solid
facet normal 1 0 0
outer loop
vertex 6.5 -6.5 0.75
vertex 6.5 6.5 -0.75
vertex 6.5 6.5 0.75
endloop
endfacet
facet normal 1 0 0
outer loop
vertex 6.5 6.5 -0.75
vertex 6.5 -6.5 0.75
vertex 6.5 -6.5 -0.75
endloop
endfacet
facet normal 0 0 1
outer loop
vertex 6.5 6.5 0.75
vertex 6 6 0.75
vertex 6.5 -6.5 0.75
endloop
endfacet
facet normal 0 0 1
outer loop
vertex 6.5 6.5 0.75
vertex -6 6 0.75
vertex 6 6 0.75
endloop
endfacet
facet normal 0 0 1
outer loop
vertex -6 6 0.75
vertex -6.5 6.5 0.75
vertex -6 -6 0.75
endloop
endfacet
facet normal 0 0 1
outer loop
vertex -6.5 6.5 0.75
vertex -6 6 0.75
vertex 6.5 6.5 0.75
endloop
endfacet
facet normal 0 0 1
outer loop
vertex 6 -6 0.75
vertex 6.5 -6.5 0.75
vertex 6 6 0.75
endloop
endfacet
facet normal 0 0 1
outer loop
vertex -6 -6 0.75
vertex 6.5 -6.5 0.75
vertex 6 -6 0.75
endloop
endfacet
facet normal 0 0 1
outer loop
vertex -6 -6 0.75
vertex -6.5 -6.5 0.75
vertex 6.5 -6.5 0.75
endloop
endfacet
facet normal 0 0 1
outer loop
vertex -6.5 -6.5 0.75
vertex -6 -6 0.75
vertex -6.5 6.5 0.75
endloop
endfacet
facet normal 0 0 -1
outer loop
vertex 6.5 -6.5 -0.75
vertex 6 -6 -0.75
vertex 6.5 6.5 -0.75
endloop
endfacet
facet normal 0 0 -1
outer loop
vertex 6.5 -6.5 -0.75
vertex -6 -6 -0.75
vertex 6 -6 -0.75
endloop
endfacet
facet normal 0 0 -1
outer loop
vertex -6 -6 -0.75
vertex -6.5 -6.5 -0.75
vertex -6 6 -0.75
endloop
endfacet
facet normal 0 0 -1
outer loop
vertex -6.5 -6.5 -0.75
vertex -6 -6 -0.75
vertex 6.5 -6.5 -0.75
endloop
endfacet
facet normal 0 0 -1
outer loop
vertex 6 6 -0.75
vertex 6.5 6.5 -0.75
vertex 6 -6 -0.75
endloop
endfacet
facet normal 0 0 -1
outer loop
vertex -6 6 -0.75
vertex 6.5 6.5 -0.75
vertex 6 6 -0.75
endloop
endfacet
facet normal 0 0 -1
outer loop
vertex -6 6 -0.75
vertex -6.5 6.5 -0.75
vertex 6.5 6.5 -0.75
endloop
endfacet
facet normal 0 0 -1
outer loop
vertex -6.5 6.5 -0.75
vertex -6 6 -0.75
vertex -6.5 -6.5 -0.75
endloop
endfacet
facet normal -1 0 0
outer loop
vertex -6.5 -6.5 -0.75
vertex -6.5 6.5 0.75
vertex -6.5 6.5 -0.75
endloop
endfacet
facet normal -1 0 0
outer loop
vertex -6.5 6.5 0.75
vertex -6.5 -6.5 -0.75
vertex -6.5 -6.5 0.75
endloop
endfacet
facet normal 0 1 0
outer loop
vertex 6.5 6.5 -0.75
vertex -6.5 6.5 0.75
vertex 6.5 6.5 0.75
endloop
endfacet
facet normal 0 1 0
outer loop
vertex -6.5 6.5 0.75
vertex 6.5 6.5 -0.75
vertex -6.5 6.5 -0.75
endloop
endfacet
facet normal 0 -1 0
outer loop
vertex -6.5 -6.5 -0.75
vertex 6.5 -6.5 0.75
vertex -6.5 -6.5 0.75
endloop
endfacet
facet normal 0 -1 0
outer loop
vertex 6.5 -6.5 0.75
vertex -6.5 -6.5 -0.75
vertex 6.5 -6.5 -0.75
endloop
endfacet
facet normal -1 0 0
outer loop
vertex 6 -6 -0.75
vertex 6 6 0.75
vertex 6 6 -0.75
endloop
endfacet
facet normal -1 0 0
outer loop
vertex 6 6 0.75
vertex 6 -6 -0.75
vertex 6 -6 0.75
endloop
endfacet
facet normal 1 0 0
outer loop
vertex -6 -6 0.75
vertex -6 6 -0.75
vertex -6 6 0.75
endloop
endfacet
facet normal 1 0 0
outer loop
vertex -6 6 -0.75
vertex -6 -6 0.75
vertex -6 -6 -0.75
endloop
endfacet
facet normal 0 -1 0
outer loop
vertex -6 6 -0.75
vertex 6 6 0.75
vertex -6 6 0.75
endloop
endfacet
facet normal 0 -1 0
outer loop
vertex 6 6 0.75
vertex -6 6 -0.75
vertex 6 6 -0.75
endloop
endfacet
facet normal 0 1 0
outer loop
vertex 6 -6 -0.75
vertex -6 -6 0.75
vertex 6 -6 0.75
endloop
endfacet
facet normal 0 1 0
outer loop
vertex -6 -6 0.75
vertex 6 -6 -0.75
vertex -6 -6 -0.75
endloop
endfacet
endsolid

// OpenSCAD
devide = 8;
joist = 1;


// const
bread = 12;
base = bread + joist;


// create
difference(){
    cube([base, base, bread/devide], center=true);
    cube(bread, true);
}
